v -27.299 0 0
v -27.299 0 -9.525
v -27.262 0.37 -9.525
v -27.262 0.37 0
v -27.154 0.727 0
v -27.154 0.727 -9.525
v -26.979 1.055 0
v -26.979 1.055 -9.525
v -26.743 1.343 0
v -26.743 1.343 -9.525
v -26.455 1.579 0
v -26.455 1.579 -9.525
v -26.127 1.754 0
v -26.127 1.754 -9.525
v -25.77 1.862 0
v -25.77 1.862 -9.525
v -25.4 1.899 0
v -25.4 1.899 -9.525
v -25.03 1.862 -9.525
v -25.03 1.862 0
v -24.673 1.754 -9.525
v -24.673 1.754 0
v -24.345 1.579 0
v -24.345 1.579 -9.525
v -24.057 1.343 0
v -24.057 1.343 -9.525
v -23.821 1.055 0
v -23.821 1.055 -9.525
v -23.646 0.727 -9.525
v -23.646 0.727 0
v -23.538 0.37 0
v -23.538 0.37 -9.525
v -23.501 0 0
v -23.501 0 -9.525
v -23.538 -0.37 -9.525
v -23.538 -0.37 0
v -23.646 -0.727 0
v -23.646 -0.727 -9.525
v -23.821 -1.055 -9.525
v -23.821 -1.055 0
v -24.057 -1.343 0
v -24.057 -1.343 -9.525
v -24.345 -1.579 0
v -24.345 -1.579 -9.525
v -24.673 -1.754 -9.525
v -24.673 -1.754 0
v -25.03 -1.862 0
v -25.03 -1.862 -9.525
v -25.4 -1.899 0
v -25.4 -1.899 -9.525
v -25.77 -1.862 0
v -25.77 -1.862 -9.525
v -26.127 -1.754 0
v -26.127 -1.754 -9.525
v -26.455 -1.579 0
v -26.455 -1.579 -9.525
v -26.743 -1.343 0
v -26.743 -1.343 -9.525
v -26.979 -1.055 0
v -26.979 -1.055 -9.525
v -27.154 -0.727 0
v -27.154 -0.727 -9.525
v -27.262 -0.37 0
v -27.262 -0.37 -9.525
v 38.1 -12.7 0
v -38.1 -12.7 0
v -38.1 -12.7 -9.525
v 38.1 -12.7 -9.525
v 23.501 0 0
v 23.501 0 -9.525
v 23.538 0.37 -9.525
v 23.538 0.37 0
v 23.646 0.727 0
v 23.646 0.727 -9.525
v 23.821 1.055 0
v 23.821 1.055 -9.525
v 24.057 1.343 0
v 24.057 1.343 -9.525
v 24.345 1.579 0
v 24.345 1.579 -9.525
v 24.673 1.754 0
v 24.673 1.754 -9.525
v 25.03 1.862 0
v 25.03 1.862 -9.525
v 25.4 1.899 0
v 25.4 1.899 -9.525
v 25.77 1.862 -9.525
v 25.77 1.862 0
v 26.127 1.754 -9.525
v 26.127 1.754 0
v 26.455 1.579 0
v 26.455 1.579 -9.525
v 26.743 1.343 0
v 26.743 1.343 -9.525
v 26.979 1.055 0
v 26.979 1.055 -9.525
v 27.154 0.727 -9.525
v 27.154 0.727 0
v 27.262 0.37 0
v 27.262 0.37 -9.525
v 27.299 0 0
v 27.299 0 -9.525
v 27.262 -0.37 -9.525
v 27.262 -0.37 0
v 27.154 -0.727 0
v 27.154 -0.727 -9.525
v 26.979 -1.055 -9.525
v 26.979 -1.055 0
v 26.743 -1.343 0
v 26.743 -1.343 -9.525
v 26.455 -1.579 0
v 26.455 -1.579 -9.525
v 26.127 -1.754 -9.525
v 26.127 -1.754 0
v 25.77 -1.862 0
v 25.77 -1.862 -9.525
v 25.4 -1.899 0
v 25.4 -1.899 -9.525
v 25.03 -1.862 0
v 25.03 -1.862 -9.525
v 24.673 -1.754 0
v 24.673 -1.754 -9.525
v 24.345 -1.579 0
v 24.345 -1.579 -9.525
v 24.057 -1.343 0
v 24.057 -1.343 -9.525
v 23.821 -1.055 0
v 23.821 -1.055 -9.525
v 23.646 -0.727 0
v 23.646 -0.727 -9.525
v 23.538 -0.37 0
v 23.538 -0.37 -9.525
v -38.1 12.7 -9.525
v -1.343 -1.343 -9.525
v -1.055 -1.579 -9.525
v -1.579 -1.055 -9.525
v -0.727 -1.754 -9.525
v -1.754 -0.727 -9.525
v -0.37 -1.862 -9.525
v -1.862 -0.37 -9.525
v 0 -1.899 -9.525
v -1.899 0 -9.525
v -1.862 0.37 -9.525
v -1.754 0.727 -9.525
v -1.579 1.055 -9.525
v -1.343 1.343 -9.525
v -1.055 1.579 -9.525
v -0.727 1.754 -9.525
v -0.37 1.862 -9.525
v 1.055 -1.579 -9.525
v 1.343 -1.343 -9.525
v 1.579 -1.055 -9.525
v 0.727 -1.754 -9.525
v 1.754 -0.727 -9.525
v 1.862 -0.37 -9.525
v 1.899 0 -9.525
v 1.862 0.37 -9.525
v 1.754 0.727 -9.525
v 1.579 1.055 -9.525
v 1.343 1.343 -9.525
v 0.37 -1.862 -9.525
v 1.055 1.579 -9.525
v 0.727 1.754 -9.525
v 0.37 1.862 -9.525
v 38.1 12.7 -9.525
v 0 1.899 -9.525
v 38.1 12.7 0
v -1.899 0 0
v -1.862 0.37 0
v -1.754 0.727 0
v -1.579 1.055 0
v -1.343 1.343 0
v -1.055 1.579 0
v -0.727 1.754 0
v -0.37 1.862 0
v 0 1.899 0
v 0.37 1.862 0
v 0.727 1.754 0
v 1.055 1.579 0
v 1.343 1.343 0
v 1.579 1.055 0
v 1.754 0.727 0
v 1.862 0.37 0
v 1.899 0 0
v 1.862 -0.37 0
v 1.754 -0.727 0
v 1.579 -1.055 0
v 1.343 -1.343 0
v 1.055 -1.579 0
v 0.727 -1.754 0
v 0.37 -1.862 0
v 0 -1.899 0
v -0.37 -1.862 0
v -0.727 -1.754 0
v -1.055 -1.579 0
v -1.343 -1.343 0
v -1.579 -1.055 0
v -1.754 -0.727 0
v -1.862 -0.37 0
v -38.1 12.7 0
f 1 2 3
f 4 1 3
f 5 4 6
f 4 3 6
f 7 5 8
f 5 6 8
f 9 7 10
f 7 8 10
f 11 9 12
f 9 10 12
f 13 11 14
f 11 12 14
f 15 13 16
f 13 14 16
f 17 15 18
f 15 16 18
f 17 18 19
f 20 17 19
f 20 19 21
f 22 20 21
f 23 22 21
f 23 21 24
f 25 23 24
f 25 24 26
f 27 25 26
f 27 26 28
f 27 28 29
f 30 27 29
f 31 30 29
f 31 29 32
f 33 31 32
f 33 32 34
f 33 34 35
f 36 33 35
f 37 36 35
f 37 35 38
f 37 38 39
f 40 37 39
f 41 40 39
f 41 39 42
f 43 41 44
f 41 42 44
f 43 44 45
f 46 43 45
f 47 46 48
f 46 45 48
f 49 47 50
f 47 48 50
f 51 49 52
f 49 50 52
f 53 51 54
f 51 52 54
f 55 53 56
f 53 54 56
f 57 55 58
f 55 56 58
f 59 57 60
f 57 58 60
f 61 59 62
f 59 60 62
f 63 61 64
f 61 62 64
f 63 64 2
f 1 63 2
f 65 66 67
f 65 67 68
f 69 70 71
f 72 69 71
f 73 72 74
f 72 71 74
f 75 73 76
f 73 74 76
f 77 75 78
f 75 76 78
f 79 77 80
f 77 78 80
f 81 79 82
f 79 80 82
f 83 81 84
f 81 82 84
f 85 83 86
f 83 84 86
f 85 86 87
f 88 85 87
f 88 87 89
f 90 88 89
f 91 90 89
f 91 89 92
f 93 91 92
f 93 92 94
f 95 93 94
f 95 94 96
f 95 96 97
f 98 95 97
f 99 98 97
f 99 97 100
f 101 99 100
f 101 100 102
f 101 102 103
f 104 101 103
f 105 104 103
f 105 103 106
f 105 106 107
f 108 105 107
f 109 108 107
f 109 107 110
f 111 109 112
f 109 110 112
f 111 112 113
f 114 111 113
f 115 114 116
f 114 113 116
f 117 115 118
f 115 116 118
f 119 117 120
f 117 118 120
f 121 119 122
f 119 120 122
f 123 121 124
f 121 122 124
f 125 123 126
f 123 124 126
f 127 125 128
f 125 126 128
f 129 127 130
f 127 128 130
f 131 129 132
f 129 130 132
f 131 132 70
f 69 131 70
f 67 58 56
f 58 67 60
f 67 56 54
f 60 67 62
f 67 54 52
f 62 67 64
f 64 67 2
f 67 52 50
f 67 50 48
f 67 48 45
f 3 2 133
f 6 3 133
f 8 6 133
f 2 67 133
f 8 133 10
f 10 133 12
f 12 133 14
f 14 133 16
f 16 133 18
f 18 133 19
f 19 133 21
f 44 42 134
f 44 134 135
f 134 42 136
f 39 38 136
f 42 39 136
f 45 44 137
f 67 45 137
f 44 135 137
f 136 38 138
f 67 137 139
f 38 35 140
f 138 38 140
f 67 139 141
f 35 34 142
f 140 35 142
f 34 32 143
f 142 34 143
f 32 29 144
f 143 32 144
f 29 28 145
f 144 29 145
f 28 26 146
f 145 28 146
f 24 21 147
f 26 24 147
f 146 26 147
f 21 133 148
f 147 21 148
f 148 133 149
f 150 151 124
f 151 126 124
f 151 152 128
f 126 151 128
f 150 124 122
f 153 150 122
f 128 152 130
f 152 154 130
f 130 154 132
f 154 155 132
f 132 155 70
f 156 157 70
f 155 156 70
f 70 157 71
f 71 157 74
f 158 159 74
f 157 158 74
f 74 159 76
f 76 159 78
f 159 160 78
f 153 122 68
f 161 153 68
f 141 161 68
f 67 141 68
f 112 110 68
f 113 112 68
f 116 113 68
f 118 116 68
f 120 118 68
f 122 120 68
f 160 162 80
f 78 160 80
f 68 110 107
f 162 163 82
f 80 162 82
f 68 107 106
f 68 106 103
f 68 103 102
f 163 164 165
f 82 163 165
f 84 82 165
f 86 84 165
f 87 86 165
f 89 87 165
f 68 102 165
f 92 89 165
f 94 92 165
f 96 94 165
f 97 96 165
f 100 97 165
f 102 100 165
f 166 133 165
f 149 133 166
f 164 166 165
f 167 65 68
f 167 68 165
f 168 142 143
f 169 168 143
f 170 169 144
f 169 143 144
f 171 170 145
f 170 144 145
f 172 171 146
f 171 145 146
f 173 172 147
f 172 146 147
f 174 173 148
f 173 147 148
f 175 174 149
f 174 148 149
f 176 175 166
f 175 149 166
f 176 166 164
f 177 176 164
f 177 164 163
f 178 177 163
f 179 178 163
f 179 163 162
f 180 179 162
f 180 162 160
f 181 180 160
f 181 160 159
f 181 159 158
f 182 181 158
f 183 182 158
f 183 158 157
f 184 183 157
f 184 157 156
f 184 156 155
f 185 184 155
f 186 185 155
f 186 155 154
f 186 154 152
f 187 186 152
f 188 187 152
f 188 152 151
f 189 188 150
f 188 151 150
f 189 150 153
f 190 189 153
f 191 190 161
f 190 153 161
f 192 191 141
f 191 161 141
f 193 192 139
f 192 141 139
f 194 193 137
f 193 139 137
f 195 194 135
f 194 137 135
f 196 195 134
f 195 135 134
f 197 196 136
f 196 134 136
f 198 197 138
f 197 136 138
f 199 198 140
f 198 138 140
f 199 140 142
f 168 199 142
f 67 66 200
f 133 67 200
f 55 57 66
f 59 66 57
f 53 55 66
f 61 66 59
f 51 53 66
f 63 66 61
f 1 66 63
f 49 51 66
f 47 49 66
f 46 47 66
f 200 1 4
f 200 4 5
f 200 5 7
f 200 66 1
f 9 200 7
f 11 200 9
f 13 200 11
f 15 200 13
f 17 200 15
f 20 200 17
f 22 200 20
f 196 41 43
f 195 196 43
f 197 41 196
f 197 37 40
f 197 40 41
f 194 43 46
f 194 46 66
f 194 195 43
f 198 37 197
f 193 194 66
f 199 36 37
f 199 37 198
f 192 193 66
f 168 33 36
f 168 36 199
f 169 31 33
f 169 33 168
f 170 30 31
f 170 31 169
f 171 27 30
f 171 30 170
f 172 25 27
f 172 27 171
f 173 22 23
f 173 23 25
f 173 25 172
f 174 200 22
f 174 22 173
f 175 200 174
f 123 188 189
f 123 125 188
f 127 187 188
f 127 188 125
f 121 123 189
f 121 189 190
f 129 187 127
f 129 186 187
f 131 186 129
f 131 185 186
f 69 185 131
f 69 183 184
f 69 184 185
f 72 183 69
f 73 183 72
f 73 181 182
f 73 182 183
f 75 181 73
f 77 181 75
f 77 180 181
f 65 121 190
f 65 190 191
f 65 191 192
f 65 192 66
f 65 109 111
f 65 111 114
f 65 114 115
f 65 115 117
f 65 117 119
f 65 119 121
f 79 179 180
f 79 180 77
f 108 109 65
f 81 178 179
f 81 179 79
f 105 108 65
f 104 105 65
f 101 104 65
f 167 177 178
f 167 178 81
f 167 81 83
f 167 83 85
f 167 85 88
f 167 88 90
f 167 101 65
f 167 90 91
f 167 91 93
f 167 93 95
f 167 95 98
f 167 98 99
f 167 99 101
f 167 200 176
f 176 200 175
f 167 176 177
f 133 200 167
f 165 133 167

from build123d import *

# Parameters (mm, degrees)
F0_W     = 76.2
F0_H     = 25.4
F1_DEPTH = 9.525
F2_D     = 3.7973


with BuildPart() as f1:
    # F0 (on Top) → F1 (new body)
    with BuildSketch(Plane.XY):
        Rectangle(F0_W, F0_H)
    extrude(amount=-F1_DEPTH)

    # F2 (through all)
    with Locations(Plane.XY):
        with Locations((-25.4, 0), (25.4, 0), (0, 0)):
            Hole(F2_D / 2)


solid = f1.part
